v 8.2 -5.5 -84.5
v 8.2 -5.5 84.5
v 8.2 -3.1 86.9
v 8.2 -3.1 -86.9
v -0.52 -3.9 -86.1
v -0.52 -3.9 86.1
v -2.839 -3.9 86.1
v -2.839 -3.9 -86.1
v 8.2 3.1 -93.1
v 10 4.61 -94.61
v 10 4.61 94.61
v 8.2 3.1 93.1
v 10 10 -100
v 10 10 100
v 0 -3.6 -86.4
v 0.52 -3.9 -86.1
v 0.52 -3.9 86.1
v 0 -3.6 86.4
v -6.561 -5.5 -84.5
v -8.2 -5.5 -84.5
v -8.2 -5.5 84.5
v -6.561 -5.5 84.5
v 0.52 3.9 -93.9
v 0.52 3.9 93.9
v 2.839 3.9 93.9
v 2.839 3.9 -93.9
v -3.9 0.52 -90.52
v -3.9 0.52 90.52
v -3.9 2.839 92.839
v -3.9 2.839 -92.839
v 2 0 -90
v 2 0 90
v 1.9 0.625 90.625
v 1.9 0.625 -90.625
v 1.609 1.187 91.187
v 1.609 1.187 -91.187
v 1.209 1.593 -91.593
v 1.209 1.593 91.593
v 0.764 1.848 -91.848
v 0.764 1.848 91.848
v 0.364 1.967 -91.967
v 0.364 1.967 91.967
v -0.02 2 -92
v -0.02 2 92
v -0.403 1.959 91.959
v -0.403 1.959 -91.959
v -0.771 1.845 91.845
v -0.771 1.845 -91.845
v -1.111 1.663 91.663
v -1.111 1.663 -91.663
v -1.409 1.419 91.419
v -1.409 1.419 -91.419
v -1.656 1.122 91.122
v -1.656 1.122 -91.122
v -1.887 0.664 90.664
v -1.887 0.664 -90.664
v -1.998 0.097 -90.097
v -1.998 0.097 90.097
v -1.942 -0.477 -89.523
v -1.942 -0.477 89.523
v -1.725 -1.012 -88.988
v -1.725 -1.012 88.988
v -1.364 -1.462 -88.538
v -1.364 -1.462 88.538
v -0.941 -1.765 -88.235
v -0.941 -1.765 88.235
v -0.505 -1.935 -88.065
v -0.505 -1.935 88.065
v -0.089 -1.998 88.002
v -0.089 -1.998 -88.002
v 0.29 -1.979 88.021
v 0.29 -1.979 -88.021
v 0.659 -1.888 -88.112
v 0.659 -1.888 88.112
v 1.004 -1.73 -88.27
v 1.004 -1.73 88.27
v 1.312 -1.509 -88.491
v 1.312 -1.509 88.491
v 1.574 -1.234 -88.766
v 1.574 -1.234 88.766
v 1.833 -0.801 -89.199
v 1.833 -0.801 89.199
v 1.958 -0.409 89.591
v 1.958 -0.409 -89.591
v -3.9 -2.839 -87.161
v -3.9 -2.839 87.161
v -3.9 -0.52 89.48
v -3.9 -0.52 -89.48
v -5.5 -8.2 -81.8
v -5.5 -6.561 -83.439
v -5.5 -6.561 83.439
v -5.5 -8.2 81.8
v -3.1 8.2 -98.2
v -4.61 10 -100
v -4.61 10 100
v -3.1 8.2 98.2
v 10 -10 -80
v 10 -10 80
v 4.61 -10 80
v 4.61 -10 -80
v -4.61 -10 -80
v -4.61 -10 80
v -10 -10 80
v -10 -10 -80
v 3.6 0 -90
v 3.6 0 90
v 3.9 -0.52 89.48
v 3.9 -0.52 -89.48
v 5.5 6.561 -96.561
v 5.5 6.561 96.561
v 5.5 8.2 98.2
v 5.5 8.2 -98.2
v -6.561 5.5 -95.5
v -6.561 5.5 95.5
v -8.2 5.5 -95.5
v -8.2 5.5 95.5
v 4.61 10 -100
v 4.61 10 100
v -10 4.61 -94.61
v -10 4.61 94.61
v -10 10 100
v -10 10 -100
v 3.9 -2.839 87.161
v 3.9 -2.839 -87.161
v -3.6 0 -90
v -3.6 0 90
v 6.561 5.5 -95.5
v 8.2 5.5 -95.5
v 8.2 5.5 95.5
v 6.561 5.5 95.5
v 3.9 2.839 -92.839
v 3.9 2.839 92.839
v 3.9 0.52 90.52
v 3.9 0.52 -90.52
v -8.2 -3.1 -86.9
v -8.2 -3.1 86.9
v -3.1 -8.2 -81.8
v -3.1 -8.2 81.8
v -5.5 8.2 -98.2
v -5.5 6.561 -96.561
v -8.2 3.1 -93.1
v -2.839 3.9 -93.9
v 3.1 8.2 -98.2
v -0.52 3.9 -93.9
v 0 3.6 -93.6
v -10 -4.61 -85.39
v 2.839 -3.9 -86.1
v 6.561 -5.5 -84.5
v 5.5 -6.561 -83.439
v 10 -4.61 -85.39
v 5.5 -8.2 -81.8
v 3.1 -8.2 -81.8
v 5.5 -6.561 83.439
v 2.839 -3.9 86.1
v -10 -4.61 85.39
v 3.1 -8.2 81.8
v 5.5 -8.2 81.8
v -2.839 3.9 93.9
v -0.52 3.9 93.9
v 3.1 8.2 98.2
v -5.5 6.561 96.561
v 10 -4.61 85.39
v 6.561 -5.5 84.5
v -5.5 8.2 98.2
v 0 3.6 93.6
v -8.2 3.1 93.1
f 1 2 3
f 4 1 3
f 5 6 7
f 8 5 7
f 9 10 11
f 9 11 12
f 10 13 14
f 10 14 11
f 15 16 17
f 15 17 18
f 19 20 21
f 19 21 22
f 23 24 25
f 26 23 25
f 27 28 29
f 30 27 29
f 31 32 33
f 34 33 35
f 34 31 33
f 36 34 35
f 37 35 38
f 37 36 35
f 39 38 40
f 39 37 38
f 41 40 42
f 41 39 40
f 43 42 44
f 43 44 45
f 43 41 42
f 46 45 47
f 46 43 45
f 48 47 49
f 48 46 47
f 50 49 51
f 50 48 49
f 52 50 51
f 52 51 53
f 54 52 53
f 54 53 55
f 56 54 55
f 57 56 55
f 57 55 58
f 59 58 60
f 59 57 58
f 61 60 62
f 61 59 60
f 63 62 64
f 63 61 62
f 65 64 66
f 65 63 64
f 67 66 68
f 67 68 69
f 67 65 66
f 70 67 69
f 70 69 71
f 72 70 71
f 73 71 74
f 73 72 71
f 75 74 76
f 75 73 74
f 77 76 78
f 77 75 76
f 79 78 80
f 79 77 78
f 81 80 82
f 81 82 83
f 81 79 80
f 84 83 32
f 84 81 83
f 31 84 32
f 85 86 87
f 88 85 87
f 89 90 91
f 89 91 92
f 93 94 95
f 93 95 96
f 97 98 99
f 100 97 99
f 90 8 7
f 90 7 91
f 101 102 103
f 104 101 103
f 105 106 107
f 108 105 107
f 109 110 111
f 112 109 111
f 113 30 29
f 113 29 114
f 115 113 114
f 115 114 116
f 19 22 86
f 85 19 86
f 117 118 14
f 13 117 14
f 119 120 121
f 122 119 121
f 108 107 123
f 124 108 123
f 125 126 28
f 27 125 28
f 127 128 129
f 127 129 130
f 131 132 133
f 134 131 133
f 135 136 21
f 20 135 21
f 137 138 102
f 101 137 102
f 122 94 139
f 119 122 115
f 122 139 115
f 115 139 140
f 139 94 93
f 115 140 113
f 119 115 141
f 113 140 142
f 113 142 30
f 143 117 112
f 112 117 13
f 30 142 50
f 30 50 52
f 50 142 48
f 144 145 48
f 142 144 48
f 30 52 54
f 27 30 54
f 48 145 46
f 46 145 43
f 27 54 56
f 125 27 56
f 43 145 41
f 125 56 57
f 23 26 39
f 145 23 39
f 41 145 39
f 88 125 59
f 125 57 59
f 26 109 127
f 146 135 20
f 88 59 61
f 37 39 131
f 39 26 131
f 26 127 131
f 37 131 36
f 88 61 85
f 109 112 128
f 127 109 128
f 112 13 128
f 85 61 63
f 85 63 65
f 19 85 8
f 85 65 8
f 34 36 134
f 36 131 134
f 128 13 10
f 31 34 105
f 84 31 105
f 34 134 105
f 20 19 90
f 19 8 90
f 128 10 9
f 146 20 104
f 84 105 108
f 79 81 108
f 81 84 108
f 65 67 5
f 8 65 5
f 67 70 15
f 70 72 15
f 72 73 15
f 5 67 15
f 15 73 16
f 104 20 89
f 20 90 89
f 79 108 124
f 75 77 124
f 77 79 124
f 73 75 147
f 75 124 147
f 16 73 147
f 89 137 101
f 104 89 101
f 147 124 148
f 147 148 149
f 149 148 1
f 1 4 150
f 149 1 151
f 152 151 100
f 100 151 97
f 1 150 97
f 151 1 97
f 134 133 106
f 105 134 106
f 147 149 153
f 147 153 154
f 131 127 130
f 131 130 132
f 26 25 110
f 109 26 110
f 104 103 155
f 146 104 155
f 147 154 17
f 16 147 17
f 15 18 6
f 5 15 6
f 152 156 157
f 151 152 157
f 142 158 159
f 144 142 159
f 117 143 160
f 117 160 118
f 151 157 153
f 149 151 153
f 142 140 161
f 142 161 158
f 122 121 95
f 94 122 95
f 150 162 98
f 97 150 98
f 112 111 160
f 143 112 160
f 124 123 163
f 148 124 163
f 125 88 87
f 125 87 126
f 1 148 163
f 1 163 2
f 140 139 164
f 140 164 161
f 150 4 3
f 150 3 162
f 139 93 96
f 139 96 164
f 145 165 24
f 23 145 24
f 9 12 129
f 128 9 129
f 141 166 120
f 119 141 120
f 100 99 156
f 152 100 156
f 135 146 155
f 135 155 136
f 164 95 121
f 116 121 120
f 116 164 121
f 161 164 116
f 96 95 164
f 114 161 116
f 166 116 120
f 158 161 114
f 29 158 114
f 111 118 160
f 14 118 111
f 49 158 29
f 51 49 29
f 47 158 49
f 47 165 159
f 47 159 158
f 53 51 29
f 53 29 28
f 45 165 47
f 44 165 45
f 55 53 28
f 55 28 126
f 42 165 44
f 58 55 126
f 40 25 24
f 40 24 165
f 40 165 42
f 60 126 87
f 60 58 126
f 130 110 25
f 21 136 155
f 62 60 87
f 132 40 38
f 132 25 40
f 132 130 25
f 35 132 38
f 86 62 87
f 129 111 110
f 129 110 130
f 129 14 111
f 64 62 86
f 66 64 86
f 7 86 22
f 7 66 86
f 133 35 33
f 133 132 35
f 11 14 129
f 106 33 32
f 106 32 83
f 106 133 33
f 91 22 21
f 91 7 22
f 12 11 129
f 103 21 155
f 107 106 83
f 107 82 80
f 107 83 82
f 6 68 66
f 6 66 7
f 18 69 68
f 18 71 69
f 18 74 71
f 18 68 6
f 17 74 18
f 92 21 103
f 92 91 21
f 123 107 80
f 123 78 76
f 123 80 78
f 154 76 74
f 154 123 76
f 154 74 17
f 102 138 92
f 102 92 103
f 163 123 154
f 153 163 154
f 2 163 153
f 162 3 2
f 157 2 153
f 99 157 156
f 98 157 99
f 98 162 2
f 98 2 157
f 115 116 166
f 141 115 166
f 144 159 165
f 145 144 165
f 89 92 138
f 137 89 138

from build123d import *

# Parameters (mm, degrees)
SKETCH1_R           = 2
BOSS_EXTRUDE1_DEPTH = 100
CUT_EXTRUDE1_REACH  = 22


with BuildPart() as part:
    # Sketch1 → Boss-Extrude1 (new body, symmetric)
    with BuildSketch(Plane.XY):
        Polygon((10, 10), (10, 4.610379336), (8.2, 3.1), (8.2, 5.5), (6.560660172, 5.5), (3.9, 2.839339828), (3.9, 0.519615242), (3.6, 0), (3.9, -0.519615242), (3.9, -2.839339828), (6.560660172, -5.5), (8.2, -5.5), (8.2, -3.1), (10, -4.610379336), (10, -10), (4.610379336, -10), (3.1, -8.2), (5.5, -8.2), (5.5, -6.560660172), (2.839339828, -3.9), (0.519615242, -3.9), (0, -3.6), (-0.519615242, -3.9), (-2.839339828, -3.9), (-5.5, -6.560660172), (-5.5, -8.2), (-3.1, -8.2), (-4.610379336, -10), (-10, -10), (-10, -4.610379336), (-8.2, -3.1), (-8.2, -5.5), (-6.560660172, -5.5), (-3.9, -2.839339828), (-3.9, -0.519615242), (-3.6, 0), (-3.9, 0.519615242), (-3.9, 2.839339828), (-6.560660172, 5.5), (-8.2, 5.5), (-8.2, 3.1), (-10, 4.610379336), (-10, 10), (-4.610379336, 10), (-3.1, 8.2), (-5.5, 8.2), (-5.5, 6.560660172), (-2.839339828, 3.9), (-0.519615242, 3.9), (0, 3.6), (0.519615242, 3.9), (2.839339828, 3.9), (5.5, 6.560660172), (5.5, 8.2), (3.1, 8.2), (4.610379336, 10), align=None)
        Circle(SKETCH1_R, mode=Mode.SUBTRACT)
    extrude(amount=BOSS_EXTRUDE1_DEPTH, both=True)

    # Sketch2 → Cut-Extrude1 (cut, up to next)
    with BuildSketch(Plane(origin=(10, 0, 0), x_dir=(0, 0, -1), z_dir=(1, 0, 0)), mode=Mode.PRIVATE) as cut_extrude1_sk1:
        Polygon((100, 10), (80, -10), (100, -10), align=None)
    cut_extrude1_tool1 = extrude(cut_extrude1_sk1.sketch, amount=-CUT_EXTRUDE1_REACH, mode=Mode.PRIVATE) & part.part
    add(cut_extrude1_tool1.solids().sort_by_distance((10, -3.333333, -93.333333))[0], mode=Mode.SUBTRACT)
    # Sketch2 → Cut-Extrude1 (cut, up to next)
    with BuildSketch(Plane(origin=(10, 0, 0), x_dir=(0, 0, -1), z_dir=(1, 0, 0)), mode=Mode.PRIVATE) as cut_extrude1_sk2:
        Polygon((-100, 10), (-80, -10), (-100, -10), align=None)
    cut_extrude1_tool2 = extrude(cut_extrude1_sk2.sketch, amount=-CUT_EXTRUDE1_REACH, mode=Mode.PRIVATE) & part.part
    add(cut_extrude1_tool2.solids().sort_by_distance((10, -3.333333, 93.333333))[0], mode=Mode.SUBTRACT)


solid = part.part
